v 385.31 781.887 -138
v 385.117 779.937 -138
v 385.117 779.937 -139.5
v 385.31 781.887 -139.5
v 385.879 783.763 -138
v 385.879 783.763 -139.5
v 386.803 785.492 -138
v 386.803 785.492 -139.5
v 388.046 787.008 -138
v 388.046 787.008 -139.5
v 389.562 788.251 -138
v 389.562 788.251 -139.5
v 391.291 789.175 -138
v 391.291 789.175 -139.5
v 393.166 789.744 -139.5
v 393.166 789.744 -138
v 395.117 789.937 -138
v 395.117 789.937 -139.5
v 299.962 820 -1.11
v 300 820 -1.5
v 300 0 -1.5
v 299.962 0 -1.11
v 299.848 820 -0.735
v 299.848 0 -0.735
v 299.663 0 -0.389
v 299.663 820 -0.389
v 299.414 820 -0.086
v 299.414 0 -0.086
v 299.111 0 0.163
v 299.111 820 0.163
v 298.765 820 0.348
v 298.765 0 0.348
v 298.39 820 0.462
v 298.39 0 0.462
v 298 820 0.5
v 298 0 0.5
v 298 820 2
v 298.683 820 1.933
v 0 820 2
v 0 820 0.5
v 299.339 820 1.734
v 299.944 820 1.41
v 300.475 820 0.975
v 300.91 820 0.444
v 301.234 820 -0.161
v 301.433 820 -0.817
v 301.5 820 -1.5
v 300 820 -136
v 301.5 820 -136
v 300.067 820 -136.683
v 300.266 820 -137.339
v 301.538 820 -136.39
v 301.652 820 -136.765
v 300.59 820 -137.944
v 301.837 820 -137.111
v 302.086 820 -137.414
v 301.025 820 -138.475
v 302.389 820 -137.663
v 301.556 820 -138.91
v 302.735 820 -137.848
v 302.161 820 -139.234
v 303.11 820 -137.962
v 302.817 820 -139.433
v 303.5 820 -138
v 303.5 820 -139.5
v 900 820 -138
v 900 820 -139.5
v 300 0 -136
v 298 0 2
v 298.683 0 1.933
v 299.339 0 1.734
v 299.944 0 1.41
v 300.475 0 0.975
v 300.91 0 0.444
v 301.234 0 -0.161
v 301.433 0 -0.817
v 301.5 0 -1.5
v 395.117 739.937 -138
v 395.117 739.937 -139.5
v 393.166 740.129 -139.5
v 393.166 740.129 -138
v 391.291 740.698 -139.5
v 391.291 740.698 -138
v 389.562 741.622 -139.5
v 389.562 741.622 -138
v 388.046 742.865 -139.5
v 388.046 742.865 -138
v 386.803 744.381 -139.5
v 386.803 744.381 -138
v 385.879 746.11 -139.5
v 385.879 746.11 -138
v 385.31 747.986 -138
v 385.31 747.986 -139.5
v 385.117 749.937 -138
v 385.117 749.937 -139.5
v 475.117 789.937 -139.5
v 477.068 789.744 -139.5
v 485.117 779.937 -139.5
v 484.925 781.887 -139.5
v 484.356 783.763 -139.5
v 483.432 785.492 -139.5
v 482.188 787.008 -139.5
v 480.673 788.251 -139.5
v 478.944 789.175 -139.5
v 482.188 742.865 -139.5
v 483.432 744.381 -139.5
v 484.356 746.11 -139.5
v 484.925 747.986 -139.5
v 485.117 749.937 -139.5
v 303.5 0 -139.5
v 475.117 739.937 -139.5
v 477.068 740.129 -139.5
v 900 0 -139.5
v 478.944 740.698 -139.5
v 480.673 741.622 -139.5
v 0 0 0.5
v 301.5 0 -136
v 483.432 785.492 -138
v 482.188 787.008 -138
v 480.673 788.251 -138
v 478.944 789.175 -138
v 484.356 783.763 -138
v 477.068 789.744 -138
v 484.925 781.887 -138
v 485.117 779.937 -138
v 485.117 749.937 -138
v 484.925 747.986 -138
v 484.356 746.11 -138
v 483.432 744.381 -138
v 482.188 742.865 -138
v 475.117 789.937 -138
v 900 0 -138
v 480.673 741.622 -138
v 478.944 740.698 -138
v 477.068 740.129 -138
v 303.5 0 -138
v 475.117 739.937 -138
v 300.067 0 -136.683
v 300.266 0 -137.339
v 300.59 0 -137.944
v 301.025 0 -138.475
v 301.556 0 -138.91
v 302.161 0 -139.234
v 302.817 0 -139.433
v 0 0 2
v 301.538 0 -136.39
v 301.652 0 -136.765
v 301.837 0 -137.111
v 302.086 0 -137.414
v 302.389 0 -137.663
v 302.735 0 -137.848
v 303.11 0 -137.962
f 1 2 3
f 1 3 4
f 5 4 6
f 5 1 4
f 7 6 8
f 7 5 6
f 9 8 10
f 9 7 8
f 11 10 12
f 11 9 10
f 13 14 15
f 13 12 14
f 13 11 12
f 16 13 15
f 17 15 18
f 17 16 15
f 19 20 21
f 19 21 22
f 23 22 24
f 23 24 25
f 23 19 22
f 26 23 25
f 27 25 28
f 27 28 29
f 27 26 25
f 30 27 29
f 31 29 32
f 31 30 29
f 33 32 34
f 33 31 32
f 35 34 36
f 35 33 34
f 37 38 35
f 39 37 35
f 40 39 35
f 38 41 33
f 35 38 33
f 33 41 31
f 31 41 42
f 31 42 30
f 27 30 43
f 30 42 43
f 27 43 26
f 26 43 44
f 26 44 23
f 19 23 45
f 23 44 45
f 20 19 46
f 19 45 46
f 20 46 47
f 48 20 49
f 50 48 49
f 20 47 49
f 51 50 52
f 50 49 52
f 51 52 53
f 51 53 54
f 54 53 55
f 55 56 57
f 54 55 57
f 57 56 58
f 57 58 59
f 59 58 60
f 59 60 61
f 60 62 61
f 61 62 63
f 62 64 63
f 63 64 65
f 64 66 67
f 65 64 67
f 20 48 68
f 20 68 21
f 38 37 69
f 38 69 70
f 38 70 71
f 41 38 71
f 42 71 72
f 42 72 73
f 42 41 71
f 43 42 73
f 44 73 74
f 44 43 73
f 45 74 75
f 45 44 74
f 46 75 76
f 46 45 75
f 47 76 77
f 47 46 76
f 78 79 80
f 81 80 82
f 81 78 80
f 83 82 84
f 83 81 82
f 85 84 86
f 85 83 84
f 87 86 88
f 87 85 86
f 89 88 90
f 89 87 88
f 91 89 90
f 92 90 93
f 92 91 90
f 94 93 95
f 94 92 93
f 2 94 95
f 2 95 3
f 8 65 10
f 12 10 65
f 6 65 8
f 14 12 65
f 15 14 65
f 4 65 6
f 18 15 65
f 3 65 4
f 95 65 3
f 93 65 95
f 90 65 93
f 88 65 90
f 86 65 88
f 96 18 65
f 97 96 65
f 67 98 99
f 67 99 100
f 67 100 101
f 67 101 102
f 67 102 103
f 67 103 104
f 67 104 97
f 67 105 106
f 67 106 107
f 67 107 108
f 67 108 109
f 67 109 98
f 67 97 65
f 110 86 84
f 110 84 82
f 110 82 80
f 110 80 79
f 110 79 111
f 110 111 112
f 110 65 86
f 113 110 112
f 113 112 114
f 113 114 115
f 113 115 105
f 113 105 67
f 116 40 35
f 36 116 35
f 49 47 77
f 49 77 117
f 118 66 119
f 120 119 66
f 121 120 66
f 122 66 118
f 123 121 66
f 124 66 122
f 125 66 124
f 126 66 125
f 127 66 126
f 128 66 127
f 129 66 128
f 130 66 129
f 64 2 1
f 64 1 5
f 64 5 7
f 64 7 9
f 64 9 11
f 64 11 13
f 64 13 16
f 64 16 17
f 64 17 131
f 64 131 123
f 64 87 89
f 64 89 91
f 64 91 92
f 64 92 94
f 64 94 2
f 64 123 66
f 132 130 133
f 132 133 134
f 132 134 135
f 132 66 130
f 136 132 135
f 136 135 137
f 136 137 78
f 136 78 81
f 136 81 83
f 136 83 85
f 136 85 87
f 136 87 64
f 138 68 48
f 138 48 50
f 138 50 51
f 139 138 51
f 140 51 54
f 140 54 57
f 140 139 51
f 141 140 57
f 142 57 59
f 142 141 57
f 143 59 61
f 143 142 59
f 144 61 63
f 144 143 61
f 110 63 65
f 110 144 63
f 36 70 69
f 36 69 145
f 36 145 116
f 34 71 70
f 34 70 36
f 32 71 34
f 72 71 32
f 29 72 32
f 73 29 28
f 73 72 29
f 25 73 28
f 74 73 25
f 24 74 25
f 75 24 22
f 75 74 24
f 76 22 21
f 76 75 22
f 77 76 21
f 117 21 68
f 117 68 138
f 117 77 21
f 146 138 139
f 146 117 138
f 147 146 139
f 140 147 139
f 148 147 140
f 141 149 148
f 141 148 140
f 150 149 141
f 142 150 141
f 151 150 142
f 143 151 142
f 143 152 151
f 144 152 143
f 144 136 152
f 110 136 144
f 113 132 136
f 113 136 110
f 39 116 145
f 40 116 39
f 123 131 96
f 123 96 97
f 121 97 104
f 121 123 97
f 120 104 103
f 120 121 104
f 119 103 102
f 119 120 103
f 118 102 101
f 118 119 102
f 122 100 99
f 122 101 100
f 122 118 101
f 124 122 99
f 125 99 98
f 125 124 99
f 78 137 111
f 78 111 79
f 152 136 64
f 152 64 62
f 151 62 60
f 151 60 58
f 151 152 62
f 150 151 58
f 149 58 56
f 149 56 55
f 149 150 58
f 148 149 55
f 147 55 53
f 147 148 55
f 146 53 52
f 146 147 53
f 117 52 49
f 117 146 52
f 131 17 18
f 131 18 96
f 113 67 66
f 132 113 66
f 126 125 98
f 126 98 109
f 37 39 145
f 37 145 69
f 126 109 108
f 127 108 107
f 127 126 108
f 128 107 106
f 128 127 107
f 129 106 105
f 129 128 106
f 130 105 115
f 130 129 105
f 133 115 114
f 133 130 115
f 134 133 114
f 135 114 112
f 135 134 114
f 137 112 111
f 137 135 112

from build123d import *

# Parameters (mm, degrees)
SKETCH1_W                    = 300
SKETCH1_H                    = 820
BOSS_EXTRUDE1_DEPTH          = 2
CONVERT_SOLID1_OUTLINE_W     = 300
CONVERT_SOLID1_OUTLINE_H     = 820
CONVERT_SOLID1_DEPTH         = 0.5
EDGE_FLANGE1_STRIP_W         = 10
EDGE_FLANGE1_STRIP_H         = 1.5
EDGE_FLANGE1_STRIP_CUT_DEPTH = 820
EDGE_FLANGE1_DEPTH           = 820
EDGE_FLANGE2_STRIP_W         = 10
EDGE_FLANGE2_STRIP_H         = 1.5
EDGE_FLANGE2_STRIP_CUT_DEPTH = 820
EDGE_FLANGE2_DEPTH           = 820
CUT_EXTRUDE1_DEPTH           = 1226.561095988


# Read off the part's stored shape, not the designer's step: Convert-Solid1
# Sheet-metal steps are written as plain solids
with BuildPart() as part:
    # Sketch1 → Boss-Extrude1 (new body)
    with BuildSketch(Plane.XY):
        with Locations((150, 410)):
            Rectangle(SKETCH1_W, SKETCH1_H)
    extrude(amount=BOSS_EXTRUDE1_DEPTH)

    # Convert-Solid1 outline → Convert-Solid1 (cut)
    with BuildSketch(Plane.XY):
        with Locations((150, 410)):
            Rectangle(CONVERT_SOLID1_OUTLINE_W, CONVERT_SOLID1_OUTLINE_H)
    extrude(amount=CONVERT_SOLID1_DEPTH, mode=Mode.SUBTRACT)

    # Edge-Flange1 strip (across the edge) → Edge-Flange1 strip cut (cut)
    with BuildSketch(Plane(origin=(300, 820, 0.5), x_dir=(-1, 0, 0), z_dir=(0, -1, 0))):
        with Locations((-3, -0.75)):
            Rectangle(EDGE_FLANGE1_STRIP_W, EDGE_FLANGE1_STRIP_H)
    extrude(amount=EDGE_FLANGE1_STRIP_CUT_DEPTH, mode=Mode.SUBTRACT)

    # Edge-Flange1 section (across the edge) → Edge-Flange1 (add)
    with BuildSketch(Plane(origin=(300, 820, 0.5), x_dir=(-1, 0, 0), z_dir=(0, -1, 0))):
        with BuildLine():
            Line((-1.5, 2), (-1.5, 138.5))
            Line((-1.5, 138.5), (0, 138.5))
            Line((0, 138.5), (0, 2))
            ThreePointArc((0, 2), (0.585786438, 0.585786438), (2, 0))
            Line((2, 0), (2, -1.5))
            ThreePointArc((2, -1.5), (-0.474873734, -0.474873734), (-1.5, 2))
        make_face()
    extrude(amount=EDGE_FLANGE1_DEPTH)

    # Edge-Flange2 strip (across the edge) → Edge-Flange2 strip cut (cut)
    with BuildSketch(Plane(origin=(301.5, 0, -138), x_dir=(0, 0, 1), z_dir=(0, 1, 0))):
        with Locations((-3, -0.75)):
            Rectangle(EDGE_FLANGE2_STRIP_W, EDGE_FLANGE2_STRIP_H)
    extrude(amount=EDGE_FLANGE2_STRIP_CUT_DEPTH, mode=Mode.SUBTRACT)

    # Edge-Flange2 section (across the edge) → Edge-Flange2 (add)
    with BuildSketch(Plane(origin=(301.5, 0, -138), x_dir=(0, 0, 1), z_dir=(0, 1, 0))):
        with BuildLine():
            Line((-1.5, 2), (-1.5, 598.5))
            Line((-1.5, 598.5), (0, 598.5))
            Line((0, 598.5), (0, 2))
            ThreePointArc((0, 2), (0.585786438, 0.585786438), (2, 0))
            Line((2, 0), (2, -1.5))
            ThreePointArc((2, -1.5), (-0.474873734, -0.474873734), (-1.5, 2))
        make_face()
    extrude(amount=EDGE_FLANGE2_DEPTH)

    # Sketch12 → Cut-Extrude1 (cut, through all)
    with BuildSketch(Plane.XY.offset(-138)):
        with BuildLine():
            Line((395.117398745, 789.936561894), (475.117398745, 789.936561894))
            ThreePointArc((475.117398745, 789.936561894), (482.188466557, 787.007629706), (485.117398745, 779.936561894))
            Line((485.117398745, 779.936561894), (485.117398745, 749.936561894))
            ThreePointArc((485.117398745, 749.936561894), (482.188466557, 742.865494082), (475.117398745, 739.936561894))
            Line((475.117398745, 739.936561894), (395.117398745, 739.936561894))
            ThreePointArc((395.117398745, 739.936561894), (388.046330933, 742.865494082), (385.117398745, 749.936561894))
            Line((385.117398745, 749.936561894), (385.117398745, 779.936561894))
            ThreePointArc((385.117398745, 779.936561894), (388.046330933, 787.007629706), (395.117398745, 789.936561894))
        make_face()
    extrude(amount=-CUT_EXTRUDE1_DEPTH, mode=Mode.SUBTRACT)


solid = part.part
